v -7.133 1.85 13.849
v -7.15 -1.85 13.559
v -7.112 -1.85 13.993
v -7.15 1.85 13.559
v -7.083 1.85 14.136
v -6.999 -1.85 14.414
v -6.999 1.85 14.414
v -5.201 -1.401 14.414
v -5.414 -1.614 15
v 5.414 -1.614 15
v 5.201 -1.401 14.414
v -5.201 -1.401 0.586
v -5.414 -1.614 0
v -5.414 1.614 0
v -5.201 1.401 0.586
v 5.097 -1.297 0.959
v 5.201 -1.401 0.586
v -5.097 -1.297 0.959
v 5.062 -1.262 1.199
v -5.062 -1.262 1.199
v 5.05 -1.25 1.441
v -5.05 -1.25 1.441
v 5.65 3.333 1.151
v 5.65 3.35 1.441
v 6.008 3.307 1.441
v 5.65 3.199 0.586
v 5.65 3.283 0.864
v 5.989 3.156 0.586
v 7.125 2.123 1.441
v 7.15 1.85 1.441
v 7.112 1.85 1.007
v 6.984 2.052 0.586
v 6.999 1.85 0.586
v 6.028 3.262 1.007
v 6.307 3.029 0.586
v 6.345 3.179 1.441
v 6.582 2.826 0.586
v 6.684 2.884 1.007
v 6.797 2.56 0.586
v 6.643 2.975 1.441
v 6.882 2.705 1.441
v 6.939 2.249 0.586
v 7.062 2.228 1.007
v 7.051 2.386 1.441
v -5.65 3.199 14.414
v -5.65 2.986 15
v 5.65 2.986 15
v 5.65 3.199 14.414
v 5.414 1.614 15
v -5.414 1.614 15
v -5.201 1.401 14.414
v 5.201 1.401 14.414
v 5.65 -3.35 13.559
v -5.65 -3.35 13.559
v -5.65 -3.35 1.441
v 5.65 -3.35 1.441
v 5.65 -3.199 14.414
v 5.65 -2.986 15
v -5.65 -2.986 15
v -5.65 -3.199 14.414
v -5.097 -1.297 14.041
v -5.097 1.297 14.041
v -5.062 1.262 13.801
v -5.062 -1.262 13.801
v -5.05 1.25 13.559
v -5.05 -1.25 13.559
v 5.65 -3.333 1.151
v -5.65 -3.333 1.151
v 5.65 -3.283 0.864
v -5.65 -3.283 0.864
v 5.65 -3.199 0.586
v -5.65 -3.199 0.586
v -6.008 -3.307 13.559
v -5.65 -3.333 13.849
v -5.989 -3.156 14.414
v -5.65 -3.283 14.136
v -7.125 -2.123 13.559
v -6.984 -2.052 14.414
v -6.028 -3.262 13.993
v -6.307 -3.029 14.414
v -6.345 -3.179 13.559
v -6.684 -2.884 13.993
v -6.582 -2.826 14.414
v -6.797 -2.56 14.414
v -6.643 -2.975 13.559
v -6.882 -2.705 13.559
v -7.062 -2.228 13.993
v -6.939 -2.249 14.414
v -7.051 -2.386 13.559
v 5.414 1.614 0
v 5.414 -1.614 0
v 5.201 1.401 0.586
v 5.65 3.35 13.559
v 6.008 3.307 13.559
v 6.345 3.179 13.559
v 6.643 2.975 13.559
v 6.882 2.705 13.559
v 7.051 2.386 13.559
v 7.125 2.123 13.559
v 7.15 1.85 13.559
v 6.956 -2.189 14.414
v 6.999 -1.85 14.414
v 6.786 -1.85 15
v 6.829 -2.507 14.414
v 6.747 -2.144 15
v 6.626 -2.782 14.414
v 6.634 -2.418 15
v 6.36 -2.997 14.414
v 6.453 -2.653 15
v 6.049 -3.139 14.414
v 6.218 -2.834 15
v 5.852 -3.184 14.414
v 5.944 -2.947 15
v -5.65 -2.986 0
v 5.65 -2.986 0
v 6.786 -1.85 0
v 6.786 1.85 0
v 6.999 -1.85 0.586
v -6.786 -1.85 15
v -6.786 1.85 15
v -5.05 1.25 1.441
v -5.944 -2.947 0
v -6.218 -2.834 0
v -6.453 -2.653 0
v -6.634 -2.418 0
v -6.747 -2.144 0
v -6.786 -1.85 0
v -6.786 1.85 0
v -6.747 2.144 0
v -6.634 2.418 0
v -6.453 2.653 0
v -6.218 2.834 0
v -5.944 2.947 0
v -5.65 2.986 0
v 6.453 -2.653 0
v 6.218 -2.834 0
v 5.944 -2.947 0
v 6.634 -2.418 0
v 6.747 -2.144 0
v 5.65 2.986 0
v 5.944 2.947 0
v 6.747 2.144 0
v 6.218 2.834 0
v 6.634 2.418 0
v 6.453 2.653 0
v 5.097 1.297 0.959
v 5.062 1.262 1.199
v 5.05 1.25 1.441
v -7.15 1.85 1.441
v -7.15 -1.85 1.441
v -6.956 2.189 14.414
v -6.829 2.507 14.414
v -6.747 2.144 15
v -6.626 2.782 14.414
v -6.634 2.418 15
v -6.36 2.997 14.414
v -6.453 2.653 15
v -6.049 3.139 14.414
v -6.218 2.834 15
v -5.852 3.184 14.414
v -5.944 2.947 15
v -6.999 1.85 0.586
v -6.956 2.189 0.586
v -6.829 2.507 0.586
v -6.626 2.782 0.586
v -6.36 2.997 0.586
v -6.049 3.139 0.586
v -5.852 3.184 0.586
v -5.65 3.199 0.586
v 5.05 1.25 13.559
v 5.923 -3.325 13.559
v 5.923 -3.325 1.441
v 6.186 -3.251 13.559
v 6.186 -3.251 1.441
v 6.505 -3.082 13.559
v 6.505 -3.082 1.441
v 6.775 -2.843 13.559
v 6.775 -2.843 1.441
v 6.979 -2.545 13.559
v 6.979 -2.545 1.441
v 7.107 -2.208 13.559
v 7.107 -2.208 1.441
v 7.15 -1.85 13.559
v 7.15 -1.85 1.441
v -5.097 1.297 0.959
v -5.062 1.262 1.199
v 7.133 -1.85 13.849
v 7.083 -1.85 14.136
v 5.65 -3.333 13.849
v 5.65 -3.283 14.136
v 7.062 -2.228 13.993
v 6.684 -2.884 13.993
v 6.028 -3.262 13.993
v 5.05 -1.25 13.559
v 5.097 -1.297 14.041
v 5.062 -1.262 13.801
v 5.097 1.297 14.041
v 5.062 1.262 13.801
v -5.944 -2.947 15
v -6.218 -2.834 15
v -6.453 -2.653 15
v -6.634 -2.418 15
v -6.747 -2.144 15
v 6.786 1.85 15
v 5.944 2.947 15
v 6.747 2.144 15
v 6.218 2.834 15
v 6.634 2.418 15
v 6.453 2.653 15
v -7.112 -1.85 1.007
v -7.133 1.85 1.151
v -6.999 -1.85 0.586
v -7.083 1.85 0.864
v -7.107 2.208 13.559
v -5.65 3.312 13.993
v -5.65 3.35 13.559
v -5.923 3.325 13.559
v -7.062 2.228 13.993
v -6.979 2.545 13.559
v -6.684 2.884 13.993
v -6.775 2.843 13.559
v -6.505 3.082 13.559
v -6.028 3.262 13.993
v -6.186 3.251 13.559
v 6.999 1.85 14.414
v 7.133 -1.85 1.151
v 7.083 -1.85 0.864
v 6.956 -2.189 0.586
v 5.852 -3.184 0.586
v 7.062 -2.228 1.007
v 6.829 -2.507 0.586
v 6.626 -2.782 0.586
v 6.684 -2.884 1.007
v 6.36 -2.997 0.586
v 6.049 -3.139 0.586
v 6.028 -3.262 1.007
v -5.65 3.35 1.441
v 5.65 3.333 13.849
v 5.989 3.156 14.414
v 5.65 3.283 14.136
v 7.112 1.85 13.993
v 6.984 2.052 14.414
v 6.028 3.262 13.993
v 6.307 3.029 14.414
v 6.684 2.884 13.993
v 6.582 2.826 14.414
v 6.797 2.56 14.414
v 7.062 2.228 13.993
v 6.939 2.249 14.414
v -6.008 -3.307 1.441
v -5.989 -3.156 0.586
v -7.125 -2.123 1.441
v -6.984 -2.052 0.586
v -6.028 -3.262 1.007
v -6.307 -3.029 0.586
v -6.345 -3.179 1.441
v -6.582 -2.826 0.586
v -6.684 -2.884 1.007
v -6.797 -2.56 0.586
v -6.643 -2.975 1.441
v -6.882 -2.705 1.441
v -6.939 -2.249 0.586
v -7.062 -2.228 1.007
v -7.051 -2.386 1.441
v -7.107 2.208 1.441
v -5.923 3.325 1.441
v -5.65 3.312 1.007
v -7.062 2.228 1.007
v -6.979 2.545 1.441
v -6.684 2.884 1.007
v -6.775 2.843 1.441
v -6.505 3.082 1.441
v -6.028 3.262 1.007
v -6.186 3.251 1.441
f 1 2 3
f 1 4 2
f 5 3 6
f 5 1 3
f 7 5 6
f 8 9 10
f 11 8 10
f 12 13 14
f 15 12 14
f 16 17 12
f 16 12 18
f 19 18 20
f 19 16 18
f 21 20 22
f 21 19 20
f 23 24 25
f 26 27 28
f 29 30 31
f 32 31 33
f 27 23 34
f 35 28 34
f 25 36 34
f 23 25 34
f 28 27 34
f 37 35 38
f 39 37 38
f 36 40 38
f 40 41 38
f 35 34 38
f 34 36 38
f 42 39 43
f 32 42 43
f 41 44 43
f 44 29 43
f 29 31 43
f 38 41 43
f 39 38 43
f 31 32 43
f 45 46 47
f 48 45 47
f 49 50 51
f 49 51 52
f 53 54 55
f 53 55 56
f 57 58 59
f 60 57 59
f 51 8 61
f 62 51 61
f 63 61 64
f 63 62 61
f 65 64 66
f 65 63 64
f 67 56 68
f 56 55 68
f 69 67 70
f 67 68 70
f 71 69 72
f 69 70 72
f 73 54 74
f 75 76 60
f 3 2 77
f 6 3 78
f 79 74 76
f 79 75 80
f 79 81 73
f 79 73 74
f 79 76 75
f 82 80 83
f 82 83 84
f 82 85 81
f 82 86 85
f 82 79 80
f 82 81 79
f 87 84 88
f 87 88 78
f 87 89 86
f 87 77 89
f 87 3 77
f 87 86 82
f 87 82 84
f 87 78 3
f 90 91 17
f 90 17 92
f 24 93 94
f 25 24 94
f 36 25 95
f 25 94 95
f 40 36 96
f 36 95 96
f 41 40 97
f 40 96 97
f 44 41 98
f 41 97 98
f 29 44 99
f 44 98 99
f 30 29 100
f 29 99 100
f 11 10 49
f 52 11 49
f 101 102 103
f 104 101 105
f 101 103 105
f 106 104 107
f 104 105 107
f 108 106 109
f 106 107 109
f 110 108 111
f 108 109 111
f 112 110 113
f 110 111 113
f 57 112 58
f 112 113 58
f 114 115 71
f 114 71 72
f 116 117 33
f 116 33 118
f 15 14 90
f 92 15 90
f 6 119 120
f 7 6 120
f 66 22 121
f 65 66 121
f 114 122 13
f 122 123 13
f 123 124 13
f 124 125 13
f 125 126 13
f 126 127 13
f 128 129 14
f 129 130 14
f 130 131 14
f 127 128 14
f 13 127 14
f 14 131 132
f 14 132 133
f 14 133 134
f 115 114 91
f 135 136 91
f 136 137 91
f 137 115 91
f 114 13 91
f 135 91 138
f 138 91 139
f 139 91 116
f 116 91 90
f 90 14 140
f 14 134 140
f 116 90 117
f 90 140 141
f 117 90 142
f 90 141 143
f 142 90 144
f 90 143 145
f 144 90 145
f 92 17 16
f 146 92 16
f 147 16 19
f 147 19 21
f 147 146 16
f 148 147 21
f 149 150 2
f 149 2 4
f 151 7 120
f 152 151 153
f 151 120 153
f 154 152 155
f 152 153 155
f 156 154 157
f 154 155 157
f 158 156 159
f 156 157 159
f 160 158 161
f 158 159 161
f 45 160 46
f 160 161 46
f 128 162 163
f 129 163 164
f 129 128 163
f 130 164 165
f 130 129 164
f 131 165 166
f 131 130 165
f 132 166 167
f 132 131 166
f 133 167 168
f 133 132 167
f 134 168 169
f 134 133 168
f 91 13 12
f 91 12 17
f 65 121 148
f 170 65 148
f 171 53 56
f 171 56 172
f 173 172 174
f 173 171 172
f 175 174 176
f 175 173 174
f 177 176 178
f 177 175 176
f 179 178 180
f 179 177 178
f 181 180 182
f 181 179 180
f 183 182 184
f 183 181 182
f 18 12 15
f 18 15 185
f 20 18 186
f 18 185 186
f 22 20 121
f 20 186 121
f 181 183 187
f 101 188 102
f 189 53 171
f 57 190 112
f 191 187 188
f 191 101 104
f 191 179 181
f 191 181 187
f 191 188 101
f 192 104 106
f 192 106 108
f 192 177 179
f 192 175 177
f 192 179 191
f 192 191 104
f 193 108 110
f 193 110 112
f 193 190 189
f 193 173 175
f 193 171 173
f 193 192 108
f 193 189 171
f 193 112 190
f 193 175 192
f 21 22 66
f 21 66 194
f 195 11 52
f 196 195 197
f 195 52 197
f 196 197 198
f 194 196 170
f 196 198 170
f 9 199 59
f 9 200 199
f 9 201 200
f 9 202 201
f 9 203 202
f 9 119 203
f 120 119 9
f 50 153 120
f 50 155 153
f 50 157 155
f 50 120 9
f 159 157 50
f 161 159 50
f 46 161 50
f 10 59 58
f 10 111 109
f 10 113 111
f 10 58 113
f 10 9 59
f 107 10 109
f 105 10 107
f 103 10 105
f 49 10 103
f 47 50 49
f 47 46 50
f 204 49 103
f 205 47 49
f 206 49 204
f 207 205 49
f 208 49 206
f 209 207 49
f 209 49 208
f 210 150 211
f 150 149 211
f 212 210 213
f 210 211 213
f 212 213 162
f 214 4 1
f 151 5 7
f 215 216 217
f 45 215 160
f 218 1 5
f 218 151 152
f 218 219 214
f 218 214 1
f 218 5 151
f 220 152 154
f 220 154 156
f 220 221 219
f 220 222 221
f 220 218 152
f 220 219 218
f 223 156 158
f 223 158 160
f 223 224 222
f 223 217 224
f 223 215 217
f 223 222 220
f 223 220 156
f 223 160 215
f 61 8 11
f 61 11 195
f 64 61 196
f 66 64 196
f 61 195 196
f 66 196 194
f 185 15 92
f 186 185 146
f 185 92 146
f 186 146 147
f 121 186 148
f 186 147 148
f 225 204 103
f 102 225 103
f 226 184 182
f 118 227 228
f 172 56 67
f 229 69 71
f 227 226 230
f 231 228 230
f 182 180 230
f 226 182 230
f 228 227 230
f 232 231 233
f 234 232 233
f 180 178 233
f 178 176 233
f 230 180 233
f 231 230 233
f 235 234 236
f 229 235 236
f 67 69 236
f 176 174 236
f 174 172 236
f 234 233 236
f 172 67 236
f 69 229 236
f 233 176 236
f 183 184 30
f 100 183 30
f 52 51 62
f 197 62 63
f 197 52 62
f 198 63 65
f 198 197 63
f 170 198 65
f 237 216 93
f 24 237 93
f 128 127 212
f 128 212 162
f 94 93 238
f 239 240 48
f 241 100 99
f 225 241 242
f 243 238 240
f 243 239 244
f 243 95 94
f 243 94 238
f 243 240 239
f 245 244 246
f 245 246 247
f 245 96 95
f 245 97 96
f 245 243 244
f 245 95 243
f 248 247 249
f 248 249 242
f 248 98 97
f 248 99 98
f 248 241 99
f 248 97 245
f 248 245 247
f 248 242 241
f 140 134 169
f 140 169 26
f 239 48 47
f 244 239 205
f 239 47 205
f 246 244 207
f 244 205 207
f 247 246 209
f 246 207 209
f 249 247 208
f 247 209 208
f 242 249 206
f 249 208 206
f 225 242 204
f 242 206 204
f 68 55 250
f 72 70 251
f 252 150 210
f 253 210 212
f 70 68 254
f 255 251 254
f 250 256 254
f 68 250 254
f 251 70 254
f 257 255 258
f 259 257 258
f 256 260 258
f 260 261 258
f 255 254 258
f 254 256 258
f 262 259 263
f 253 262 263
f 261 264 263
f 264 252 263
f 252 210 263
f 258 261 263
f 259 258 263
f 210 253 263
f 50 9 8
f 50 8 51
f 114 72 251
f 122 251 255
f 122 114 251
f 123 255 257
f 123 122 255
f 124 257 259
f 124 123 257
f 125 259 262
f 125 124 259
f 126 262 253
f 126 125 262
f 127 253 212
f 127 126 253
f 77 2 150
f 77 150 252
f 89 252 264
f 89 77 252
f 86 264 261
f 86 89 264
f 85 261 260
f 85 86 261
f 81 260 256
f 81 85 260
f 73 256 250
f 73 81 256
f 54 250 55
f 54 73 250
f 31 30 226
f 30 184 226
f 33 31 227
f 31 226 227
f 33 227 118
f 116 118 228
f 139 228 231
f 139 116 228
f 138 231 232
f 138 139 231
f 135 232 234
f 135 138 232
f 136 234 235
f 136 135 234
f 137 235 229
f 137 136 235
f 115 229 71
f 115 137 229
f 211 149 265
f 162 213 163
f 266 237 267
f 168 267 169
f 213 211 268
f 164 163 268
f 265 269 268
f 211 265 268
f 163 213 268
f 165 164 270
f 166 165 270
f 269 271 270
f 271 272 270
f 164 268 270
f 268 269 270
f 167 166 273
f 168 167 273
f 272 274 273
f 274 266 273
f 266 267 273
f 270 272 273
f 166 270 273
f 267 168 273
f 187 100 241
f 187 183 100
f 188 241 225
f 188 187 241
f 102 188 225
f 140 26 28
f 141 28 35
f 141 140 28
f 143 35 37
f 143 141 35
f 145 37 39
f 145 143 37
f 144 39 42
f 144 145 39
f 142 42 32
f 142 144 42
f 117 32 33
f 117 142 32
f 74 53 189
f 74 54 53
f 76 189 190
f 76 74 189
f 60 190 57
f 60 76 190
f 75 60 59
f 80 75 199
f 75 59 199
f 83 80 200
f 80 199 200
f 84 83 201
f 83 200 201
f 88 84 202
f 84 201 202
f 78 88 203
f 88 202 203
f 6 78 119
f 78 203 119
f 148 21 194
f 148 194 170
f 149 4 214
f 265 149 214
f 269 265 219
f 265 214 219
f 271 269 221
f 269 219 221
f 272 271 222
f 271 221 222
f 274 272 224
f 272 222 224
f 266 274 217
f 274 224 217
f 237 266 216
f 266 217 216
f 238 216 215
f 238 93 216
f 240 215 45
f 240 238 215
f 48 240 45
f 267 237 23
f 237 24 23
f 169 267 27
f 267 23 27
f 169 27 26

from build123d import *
from OCP.BRepFilletAPI import BRepFilletAPI_MakeChamfer

# Parameters (mm, degrees)
PROFILE_SKETCH_W         = 14.3
PROFILE_SKETCH_H         = 6.7
PROFILE_SKETCH_W_2       = 10.1
PROFILE_SKETCH_H_2       = 2.5
PROFILE_EXTRUDE_DEPTH    = 15
OUTSIDE_CORNER_FILLETS_R = 1.5
END_1_CHAMFER_SIZE       = 1
END_1_CHAMFER_SIZE2      = 0.363970234
END_2_CHAMFER_SIZE       = 1
END_2_CHAMFER_SIZE2      = 0.363970234
TRANSITION_FILLETS_R     = 2.5


with BuildPart() as part:
    # Profile Sketch → Profile Extrude (new body)
    with BuildSketch(Plane.XY):
        Rectangle(PROFILE_SKETCH_W, PROFILE_SKETCH_H)
        Rectangle(PROFILE_SKETCH_W_2, PROFILE_SKETCH_H_2, mode=Mode.SUBTRACT)
    extrude(amount=PROFILE_EXTRUDE_DEPTH)

    # Outside Corner Fillets
    outside_corner_fillets_edges = [part.edges().sort_by_distance(p)[0] for p in [
        (7.15, -3.35, 7.5),
        (-7.15, -3.35, 7.5),
        (-7.15, 3.35, 7.5),
        (7.15, 3.35, 7.5),
    ]]
    fillet(outside_corner_fillets_edges, radius=OUTSIDE_CORNER_FILLETS_R)

    # End 1 Chamfer: one chamfer whose edges measure the first distance from different faces: ONE call of the kernel's chamfer builder (chamfer() names one face for all edges)
    end_1_chamfer_edges_1 = [part.edges().sort_by_distance(p)[0] for p in [
        (5.05, 0, 15),
    ]]
    end_1_chamfer_side_1 = [part.faces().sort_by_distance(p)[0] for p in [
        (5.05, 0, 7.5),
    ]]
    end_1_chamfer_edges_2 = [part.edges().sort_by_distance(p)[0] for p in [
        (0, 1.25, 15),
    ]]
    end_1_chamfer_side_2 = [part.faces().sort_by_distance(p)[0] for p in [
        (0, 1.25, 7.5),
    ]]
    end_1_chamfer_edges_3 = [part.edges().sort_by_distance(p)[0] for p in [
        (-5.05, 0, 15),
    ]]
    end_1_chamfer_side_3 = [part.faces().sort_by_distance(p)[0] for p in [
        (-5.05, 0, 7.5),
    ]]
    end_1_chamfer_edges_4 = [part.edges().sort_by_distance(p)[0] for p in [
        (0, -1.25, 15),
    ]]
    end_1_chamfer_side_4 = [part.faces().sort_by_distance(p)[0] for p in [
        (0, -1.25, 7.5),
    ]]
    end_1_chamfer_edges_5 = [part.edges().sort_by_distance(p)[0] for p in [
        (0, 3.35, 0),
    ]]
    end_1_chamfer_side_5 = [part.faces().sort_by_distance(p)[0] for p in [
        (0, 3.35, 7.5),
    ]]
    end_1_chamfer_edges_6 = [part.edges().sort_by_distance(p)[0] for p in [
        (7.15, 0, 0),
    ]]
    end_1_chamfer_side_6 = [part.faces().sort_by_distance(p)[0] for p in [
        (7.15, 0, 7.5),
    ]]
    end_1_chamfer_edges_7 = [part.edges().sort_by_distance(p)[0] for p in [
        (0, -3.35, 0),
    ]]
    end_1_chamfer_side_7 = [part.faces().sort_by_distance(p)[0] for p in [
        (0, -3.35, 7.5),
    ]]
    end_1_chamfer_edges_8 = [part.edges().sort_by_distance(p)[0] for p in [
        (-7.15, 0, 0),
    ]]
    end_1_chamfer_side_8 = [part.faces().sort_by_distance(p)[0] for p in [
        (-7.15, 0, 7.5),
    ]]
    end_1_chamfer_edges_9 = [part.edges().sort_by_distance(p)[0] for p in [
        (-6.710660172, -2.910660172, 0),
    ]]
    end_1_chamfer_side_9 = [part.faces().sort_by_distance(p)[0] for p in [
        (-6.710660172, -2.910660172, 7.5),
    ]]
    end_1_chamfer_edges_10 = [part.edges().sort_by_distance(p)[0] for p in [
        (-6.710660172, 2.910660172, 0),
    ]]
    end_1_chamfer_side_10 = [part.faces().sort_by_distance(p)[0] for p in [
        (-6.710660172, 2.910660172, 7.5),
    ]]
    end_1_chamfer_edges_11 = [part.edges().sort_by_distance(p)[0] for p in [
        (6.710660172, -2.910660172, 0),
    ]]
    end_1_chamfer_side_11 = [part.faces().sort_by_distance(p)[0] for p in [
        (6.710660172, -2.910660172, 7.5),
    ]]
    end_1_chamfer_edges_12 = [part.edges().sort_by_distance(p)[0] for p in [
        (6.710660172, 2.910660172, 0),
    ]]
    end_1_chamfer_side_12 = [part.faces().sort_by_distance(p)[0] for p in [
        (6.710660172, 2.910660172, 7.5),
    ]]
    end_1_chamfer = BRepFilletAPI_MakeChamfer(part.part.solid().wrapped)
    for e in end_1_chamfer_edges_1:
        end_1_chamfer.Add(END_1_CHAMFER_SIZE, END_1_CHAMFER_SIZE2, e.wrapped, end_1_chamfer_side_1[0].wrapped)  # the first distance lies on this face
    for e in end_1_chamfer_edges_2:
        end_1_chamfer.Add(END_1_CHAMFER_SIZE, END_1_CHAMFER_SIZE2, e.wrapped, end_1_chamfer_side_2[0].wrapped)  # the first distance lies on this face
    for e in end_1_chamfer_edges_3:
        end_1_chamfer.Add(END_1_CHAMFER_SIZE, END_1_CHAMFER_SIZE2, e.wrapped, end_1_chamfer_side_3[0].wrapped)  # the first distance lies on this face
    for e in end_1_chamfer_edges_4:
        end_1_chamfer.Add(END_1_CHAMFER_SIZE, END_1_CHAMFER_SIZE2, e.wrapped, end_1_chamfer_side_4[0].wrapped)  # the first distance lies on this face
    for e in end_1_chamfer_edges_5:
        end_1_chamfer.Add(END_1_CHAMFER_SIZE, END_1_CHAMFER_SIZE2, e.wrapped, end_1_chamfer_side_5[0].wrapped)  # the first distance lies on this face
    for e in end_1_chamfer_edges_6:
        end_1_chamfer.Add(END_1_CHAMFER_SIZE, END_1_CHAMFER_SIZE2, e.wrapped, end_1_chamfer_side_6[0].wrapped)  # the first distance lies on this face
    for e in end_1_chamfer_edges_7:
        end_1_chamfer.Add(END_1_CHAMFER_SIZE, END_1_CHAMFER_SIZE2, e.wrapped, end_1_chamfer_side_7[0].wrapped)  # the first distance lies on this face
    for e in end_1_chamfer_edges_8:
        end_1_chamfer.Add(END_1_CHAMFER_SIZE, END_1_CHAMFER_SIZE2, e.wrapped, end_1_chamfer_side_8[0].wrapped)  # the first distance lies on this face
    for e in end_1_chamfer_edges_9:
        end_1_chamfer.Add(END_1_CHAMFER_SIZE, END_1_CHAMFER_SIZE2, e.wrapped, end_1_chamfer_side_9[0].wrapped)  # the first distance lies on this face
    for e in end_1_chamfer_edges_10:
        end_1_chamfer.Add(END_1_CHAMFER_SIZE, END_1_CHAMFER_SIZE2, e.wrapped, end_1_chamfer_side_10[0].wrapped)  # the first distance lies on this face
    for e in end_1_chamfer_edges_11:
        end_1_chamfer.Add(END_1_CHAMFER_SIZE, END_1_CHAMFER_SIZE2, e.wrapped, end_1_chamfer_side_11[0].wrapped)  # the first distance lies on this face
    for e in end_1_chamfer_edges_12:
        end_1_chamfer.Add(END_1_CHAMFER_SIZE, END_1_CHAMFER_SIZE2, e.wrapped, end_1_chamfer_side_12[0].wrapped)  # the first distance lies on this face
    add(Compound.cast(end_1_chamfer.Shape()), mode=Mode.REPLACE)

    # End 2 Chamfer: one chamfer whose edges measure the first distance from different faces: ONE call of the kernel's chamfer builder (chamfer() names one face for all edges)
    end_2_chamfer_edges_1 = [part.edges().sort_by_distance(p)[0] for p in [
        (5.05, 0, 0),
    ]]
    end_2_chamfer_side_1 = [part.faces().sort_by_distance(p)[0] for p in [
        (5.05, 0, 7),
    ]]
    end_2_chamfer_edges_2 = [part.edges().sort_by_distance(p)[0] for p in [
        (0, 1.25, 0),
    ]]
    end_2_chamfer_side_2 = [part.faces().sort_by_distance(p)[0] for p in [
        (0, 1.25, 7),
    ]]
    end_2_chamfer_edges_3 = [part.edges().sort_by_distance(p)[0] for p in [
        (-5.05, 0, 0),
    ]]
    end_2_chamfer_side_3 = [part.faces().sort_by_distance(p)[0] for p in [
        (-5.05, 0, 7),
    ]]
    end_2_chamfer_edges_4 = [part.edges().sort_by_distance(p)[0] for p in [
        (0, -1.25, 0),
    ]]
    end_2_chamfer_side_4 = [part.faces().sort_by_distance(p)[0] for p in [
        (0, -1.25, 7),
    ]]
    end_2_chamfer_edges_5 = [part.edges().sort_by_distance(p)[0] for p in [
        (0, 3.35, 15),
    ]]
    end_2_chamfer_side_5 = [part.faces().sort_by_distance(p)[0] for p in [
        (0, 3.35, 8),
    ]]
    end_2_chamfer_edges_6 = [part.edges().sort_by_distance(p)[0] for p in [
        (7.15, 0, 15),
    ]]
    end_2_chamfer_side_6 = [part.faces().sort_by_distance(p)[0] for p in [
        (7.15, 0, 8),
    ]]
    end_2_chamfer_edges_7 = [part.edges().sort_by_distance(p)[0] for p in [
        (-7.15, 0, 15),
    ]]
    end_2_chamfer_side_7 = [part.faces().sort_by_distance(p)[0] for p in [
        (-7.15, 0, 8),
    ]]
    end_2_chamfer_edges_8 = [part.edges().sort_by_distance(p)[0] for p in [
        (0, -3.35, 15),
    ]]
    end_2_chamfer_side_8 = [part.faces().sort_by_distance(p)[0] for p in [
        (0, -3.35, 8),
    ]]
    end_2_chamfer_edges_9 = [part.edges().sort_by_distance(p)[0] for p in [
        (-6.710660172, -2.910660172, 15),
    ]]
    end_2_chamfer_side_9 = [part.faces().sort_by_distance(p)[0] for p in [
        (-6.710660172, -2.910660172, 8),
    ]]
    end_2_chamfer_edges_10 = [part.edges().sort_by_distance(p)[0] for p in [
        (-6.710660172, 2.910660172, 15),
    ]]
    end_2_chamfer_side_10 = [part.faces().sort_by_distance(p)[0] for p in [
        (-6.710660172, 2.910660172, 8),
    ]]
    end_2_chamfer_edges_11 = [part.edges().sort_by_distance(p)[0] for p in [
        (6.710660172, -2.910660172, 15),
    ]]
    end_2_chamfer_side_11 = [part.faces().sort_by_distance(p)[0] for p in [
        (6.710660172, -2.910660172, 8),
    ]]
    end_2_chamfer_edges_12 = [part.edges().sort_by_distance(p)[0] for p in [
        (6.710660172, 2.910660172, 15),
    ]]
    end_2_chamfer_side_12 = [part.faces().sort_by_distance(p)[0] for p in [
        (6.710660172, 2.910660172, 8),
    ]]
    end_2_chamfer = BRepFilletAPI_MakeChamfer(part.part.solid().wrapped)
    for e in end_2_chamfer_edges_1:
        end_2_chamfer.Add(END_2_CHAMFER_SIZE, END_2_CHAMFER_SIZE2, e.wrapped, end_2_chamfer_side_1[0].wrapped)  # the first distance lies on this face
    for e in end_2_chamfer_edges_2:
        end_2_chamfer.Add(END_2_CHAMFER_SIZE, END_2_CHAMFER_SIZE2, e.wrapped, end_2_chamfer_side_2[0].wrapped)  # the first distance lies on this face
    for e in end_2_chamfer_edges_3:
        end_2_chamfer.Add(END_2_CHAMFER_SIZE, END_2_CHAMFER_SIZE2, e.wrapped, end_2_chamfer_side_3[0].wrapped)  # the first distance lies on this face
    for e in end_2_chamfer_edges_4:
        end_2_chamfer.Add(END_2_CHAMFER_SIZE, END_2_CHAMFER_SIZE2, e.wrapped, end_2_chamfer_side_4[0].wrapped)  # the first distance lies on this face
    for e in end_2_chamfer_edges_5:
        end_2_chamfer.Add(END_2_CHAMFER_SIZE, END_2_CHAMFER_SIZE2, e.wrapped, end_2_chamfer_side_5[0].wrapped)  # the first distance lies on this face
    for e in end_2_chamfer_edges_6:
        end_2_chamfer.Add(END_2_CHAMFER_SIZE, END_2_CHAMFER_SIZE2, e.wrapped, end_2_chamfer_side_6[0].wrapped)  # the first distance lies on this face
    for e in end_2_chamfer_edges_7:
        end_2_chamfer.Add(END_2_CHAMFER_SIZE, END_2_CHAMFER_SIZE2, e.wrapped, end_2_chamfer_side_7[0].wrapped)  # the first distance lies on this face
    for e in end_2_chamfer_edges_8:
        end_2_chamfer.Add(END_2_CHAMFER_SIZE, END_2_CHAMFER_SIZE2, e.wrapped, end_2_chamfer_side_8[0].wrapped)  # the first distance lies on this face
    for e in end_2_chamfer_edges_9:
        end_2_chamfer.Add(END_2_CHAMFER_SIZE, END_2_CHAMFER_SIZE2, e.wrapped, end_2_chamfer_side_9[0].wrapped)  # the first distance lies on this face
    for e in end_2_chamfer_edges_10:
        end_2_chamfer.Add(END_2_CHAMFER_SIZE, END_2_CHAMFER_SIZE2, e.wrapped, end_2_chamfer_side_10[0].wrapped)  # the first distance lies on this face
    for e in end_2_chamfer_edges_11:
        end_2_chamfer.Add(END_2_CHAMFER_SIZE, END_2_CHAMFER_SIZE2, e.wrapped, end_2_chamfer_side_11[0].wrapped)  # the first distance lies on this face
    for e in end_2_chamfer_edges_12:
        end_2_chamfer.Add(END_2_CHAMFER_SIZE, END_2_CHAMFER_SIZE2, e.wrapped, end_2_chamfer_side_12[0].wrapped)  # the first distance lies on this face
    add(Compound.cast(end_2_chamfer.Shape()), mode=Mode.REPLACE)

    # Transition Fillets
    transition_fillets_edges = [part.edges().sort_by_distance(p)[0] for p in [
        (0, -3.35, 14),
        (6.710660172, -2.910660172, 14),
        (-6.710660172, -2.910660172, 14),
        (7.15, 0, 14),
        (-7.15, 0, 14),
        (6.710660172, 2.910660172, 14),
        (-6.710660172, 2.910660172, 14),
        (0, 3.35, 14),
        (5.05, 0, 14),
        (0, 1.25, 14),
        (-5.05, 0, 14),
        (0, -1.25, 14),
        (0, -3.35, 1),
        (6.710660172, -2.910660172, 1),
        (-6.710660172, -2.910660172, 1),
        (7.15, 0, 1),
        (-7.15, 0, 1),
        (6.710660172, 2.910660172, 1),
        (-6.710660172, 2.910660172, 1),
        (0, 3.35, 1),
        (5.05, 0, 1),
        (0, 1.25, 1),
        (-5.05, 0, 1),
        (0, -1.25, 1),
    ]]
    fillet(transition_fillets_edges, radius=TRANSITION_FILLETS_R)


solid = part.part
